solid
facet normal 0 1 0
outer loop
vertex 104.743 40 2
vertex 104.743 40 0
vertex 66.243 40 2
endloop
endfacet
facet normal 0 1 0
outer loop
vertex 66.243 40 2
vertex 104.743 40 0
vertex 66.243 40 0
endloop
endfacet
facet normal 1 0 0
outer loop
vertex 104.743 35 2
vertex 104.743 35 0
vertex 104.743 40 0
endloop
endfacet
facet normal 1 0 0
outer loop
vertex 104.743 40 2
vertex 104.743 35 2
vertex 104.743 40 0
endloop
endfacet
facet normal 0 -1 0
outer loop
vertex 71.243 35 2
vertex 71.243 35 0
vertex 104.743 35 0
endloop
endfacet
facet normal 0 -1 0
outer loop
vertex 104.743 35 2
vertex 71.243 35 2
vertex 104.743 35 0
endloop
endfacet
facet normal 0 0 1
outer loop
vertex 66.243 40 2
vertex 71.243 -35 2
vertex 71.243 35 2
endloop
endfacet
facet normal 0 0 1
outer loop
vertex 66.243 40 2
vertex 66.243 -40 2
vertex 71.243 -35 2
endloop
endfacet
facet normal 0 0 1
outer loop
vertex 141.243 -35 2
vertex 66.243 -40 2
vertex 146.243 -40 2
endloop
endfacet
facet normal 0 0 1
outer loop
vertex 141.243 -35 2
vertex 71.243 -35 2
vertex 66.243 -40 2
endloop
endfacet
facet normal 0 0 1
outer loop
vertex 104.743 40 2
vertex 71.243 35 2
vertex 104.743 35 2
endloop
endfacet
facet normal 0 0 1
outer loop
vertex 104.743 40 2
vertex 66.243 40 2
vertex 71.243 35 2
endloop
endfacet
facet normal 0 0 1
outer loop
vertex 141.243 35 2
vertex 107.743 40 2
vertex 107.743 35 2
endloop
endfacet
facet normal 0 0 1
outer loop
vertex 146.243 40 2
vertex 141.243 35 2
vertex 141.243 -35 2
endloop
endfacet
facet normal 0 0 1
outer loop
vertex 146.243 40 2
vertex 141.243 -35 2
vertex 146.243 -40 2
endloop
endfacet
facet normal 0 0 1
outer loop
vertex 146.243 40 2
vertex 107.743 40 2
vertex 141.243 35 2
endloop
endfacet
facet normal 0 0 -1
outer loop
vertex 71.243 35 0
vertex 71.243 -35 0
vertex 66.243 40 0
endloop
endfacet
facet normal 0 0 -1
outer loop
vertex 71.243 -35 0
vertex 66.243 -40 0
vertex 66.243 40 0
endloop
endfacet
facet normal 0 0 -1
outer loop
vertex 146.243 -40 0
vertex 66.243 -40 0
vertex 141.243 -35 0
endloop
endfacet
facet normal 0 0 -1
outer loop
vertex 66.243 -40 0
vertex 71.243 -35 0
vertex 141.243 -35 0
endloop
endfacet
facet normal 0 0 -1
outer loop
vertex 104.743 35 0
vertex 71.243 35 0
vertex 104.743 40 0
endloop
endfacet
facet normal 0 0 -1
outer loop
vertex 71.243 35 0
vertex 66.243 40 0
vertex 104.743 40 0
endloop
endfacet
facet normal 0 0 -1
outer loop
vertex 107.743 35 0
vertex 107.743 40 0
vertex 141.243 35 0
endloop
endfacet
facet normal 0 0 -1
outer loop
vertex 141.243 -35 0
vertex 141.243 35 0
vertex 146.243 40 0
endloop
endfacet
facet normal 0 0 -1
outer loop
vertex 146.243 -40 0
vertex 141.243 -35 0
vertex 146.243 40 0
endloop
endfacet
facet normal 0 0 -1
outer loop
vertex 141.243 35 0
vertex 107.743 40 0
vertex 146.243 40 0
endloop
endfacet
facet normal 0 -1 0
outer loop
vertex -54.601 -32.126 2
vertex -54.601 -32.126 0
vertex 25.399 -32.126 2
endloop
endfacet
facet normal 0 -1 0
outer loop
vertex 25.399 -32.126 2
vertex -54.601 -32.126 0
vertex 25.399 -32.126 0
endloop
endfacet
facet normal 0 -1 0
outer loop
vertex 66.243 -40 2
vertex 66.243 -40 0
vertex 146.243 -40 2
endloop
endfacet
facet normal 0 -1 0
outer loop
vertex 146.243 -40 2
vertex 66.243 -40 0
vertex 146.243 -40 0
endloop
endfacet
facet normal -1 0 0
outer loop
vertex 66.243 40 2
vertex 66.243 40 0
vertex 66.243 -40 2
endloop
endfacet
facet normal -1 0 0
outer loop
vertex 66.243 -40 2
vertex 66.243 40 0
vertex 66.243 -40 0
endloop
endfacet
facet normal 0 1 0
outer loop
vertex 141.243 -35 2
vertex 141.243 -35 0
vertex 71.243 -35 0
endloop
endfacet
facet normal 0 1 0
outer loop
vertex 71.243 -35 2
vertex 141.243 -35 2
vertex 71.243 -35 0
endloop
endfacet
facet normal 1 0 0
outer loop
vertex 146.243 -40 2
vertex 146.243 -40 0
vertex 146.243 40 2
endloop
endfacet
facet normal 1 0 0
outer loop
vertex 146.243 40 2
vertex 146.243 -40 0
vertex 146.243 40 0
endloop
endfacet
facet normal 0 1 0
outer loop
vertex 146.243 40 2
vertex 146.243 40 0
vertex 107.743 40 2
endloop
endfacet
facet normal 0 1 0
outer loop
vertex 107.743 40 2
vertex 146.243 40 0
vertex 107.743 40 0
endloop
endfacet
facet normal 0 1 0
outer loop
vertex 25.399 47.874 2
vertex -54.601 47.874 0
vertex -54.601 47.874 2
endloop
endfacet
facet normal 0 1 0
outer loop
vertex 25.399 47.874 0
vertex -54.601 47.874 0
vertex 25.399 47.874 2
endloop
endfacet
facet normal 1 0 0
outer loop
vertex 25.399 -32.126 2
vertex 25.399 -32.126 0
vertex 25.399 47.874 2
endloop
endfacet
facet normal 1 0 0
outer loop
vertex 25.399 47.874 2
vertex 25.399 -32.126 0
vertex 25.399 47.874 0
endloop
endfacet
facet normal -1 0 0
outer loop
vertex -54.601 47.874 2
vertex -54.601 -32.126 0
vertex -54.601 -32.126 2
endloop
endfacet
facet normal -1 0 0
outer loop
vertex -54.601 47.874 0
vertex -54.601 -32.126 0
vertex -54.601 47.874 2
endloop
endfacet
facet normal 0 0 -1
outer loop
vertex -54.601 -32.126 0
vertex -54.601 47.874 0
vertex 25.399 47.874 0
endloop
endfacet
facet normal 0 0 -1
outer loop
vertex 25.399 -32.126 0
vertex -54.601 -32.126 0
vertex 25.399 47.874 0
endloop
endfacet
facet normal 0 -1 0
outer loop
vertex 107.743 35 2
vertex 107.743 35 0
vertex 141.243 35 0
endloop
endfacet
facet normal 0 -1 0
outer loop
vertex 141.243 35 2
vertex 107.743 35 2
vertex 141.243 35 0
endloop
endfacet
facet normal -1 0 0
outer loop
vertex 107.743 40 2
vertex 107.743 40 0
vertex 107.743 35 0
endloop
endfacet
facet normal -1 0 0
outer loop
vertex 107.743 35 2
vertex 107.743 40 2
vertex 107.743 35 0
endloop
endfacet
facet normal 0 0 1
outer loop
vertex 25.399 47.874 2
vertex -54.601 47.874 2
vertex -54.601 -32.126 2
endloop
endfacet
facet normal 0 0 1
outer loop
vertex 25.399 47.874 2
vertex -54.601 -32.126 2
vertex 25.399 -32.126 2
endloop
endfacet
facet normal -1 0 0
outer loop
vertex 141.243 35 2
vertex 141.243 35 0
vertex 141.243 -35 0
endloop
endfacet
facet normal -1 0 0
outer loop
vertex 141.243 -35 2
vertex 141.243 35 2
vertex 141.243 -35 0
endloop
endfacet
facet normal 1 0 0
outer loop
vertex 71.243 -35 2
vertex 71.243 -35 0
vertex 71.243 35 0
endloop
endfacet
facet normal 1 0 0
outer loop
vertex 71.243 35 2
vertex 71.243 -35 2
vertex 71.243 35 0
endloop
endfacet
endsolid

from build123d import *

# Parameters (mm, degrees)
F0_W     = 80
F0_H     = 80
F2_DEPTH = 2
F3_DEPTH = 2


with BuildPart() as f2:
    # F0 (on Top) → F2 (new body)
    with BuildSketch(Plane.XY):
        with Locations((-14.600592, 7.873829)):
            Rectangle(F0_W, F0_H)
    extrude(amount=F2_DEPTH)


with BuildPart() as f3:
    # F1 (on Top) → F3 (new body)
    with BuildSketch(Plane.XY):
        Polygon((66.242605, -40), (146.242605, -40), (146.242605, 40), (107.742605, 40), (107.742605, 35), (141.242605, 35), (141.242605, -35), (71.242605, -35), (71.242605, 35), (104.742605, 35), (104.742605, 40), (66.242605, 40), align=None)
    extrude(amount=F3_DEPTH)


solid = Compound([f2.part, f3.part])
